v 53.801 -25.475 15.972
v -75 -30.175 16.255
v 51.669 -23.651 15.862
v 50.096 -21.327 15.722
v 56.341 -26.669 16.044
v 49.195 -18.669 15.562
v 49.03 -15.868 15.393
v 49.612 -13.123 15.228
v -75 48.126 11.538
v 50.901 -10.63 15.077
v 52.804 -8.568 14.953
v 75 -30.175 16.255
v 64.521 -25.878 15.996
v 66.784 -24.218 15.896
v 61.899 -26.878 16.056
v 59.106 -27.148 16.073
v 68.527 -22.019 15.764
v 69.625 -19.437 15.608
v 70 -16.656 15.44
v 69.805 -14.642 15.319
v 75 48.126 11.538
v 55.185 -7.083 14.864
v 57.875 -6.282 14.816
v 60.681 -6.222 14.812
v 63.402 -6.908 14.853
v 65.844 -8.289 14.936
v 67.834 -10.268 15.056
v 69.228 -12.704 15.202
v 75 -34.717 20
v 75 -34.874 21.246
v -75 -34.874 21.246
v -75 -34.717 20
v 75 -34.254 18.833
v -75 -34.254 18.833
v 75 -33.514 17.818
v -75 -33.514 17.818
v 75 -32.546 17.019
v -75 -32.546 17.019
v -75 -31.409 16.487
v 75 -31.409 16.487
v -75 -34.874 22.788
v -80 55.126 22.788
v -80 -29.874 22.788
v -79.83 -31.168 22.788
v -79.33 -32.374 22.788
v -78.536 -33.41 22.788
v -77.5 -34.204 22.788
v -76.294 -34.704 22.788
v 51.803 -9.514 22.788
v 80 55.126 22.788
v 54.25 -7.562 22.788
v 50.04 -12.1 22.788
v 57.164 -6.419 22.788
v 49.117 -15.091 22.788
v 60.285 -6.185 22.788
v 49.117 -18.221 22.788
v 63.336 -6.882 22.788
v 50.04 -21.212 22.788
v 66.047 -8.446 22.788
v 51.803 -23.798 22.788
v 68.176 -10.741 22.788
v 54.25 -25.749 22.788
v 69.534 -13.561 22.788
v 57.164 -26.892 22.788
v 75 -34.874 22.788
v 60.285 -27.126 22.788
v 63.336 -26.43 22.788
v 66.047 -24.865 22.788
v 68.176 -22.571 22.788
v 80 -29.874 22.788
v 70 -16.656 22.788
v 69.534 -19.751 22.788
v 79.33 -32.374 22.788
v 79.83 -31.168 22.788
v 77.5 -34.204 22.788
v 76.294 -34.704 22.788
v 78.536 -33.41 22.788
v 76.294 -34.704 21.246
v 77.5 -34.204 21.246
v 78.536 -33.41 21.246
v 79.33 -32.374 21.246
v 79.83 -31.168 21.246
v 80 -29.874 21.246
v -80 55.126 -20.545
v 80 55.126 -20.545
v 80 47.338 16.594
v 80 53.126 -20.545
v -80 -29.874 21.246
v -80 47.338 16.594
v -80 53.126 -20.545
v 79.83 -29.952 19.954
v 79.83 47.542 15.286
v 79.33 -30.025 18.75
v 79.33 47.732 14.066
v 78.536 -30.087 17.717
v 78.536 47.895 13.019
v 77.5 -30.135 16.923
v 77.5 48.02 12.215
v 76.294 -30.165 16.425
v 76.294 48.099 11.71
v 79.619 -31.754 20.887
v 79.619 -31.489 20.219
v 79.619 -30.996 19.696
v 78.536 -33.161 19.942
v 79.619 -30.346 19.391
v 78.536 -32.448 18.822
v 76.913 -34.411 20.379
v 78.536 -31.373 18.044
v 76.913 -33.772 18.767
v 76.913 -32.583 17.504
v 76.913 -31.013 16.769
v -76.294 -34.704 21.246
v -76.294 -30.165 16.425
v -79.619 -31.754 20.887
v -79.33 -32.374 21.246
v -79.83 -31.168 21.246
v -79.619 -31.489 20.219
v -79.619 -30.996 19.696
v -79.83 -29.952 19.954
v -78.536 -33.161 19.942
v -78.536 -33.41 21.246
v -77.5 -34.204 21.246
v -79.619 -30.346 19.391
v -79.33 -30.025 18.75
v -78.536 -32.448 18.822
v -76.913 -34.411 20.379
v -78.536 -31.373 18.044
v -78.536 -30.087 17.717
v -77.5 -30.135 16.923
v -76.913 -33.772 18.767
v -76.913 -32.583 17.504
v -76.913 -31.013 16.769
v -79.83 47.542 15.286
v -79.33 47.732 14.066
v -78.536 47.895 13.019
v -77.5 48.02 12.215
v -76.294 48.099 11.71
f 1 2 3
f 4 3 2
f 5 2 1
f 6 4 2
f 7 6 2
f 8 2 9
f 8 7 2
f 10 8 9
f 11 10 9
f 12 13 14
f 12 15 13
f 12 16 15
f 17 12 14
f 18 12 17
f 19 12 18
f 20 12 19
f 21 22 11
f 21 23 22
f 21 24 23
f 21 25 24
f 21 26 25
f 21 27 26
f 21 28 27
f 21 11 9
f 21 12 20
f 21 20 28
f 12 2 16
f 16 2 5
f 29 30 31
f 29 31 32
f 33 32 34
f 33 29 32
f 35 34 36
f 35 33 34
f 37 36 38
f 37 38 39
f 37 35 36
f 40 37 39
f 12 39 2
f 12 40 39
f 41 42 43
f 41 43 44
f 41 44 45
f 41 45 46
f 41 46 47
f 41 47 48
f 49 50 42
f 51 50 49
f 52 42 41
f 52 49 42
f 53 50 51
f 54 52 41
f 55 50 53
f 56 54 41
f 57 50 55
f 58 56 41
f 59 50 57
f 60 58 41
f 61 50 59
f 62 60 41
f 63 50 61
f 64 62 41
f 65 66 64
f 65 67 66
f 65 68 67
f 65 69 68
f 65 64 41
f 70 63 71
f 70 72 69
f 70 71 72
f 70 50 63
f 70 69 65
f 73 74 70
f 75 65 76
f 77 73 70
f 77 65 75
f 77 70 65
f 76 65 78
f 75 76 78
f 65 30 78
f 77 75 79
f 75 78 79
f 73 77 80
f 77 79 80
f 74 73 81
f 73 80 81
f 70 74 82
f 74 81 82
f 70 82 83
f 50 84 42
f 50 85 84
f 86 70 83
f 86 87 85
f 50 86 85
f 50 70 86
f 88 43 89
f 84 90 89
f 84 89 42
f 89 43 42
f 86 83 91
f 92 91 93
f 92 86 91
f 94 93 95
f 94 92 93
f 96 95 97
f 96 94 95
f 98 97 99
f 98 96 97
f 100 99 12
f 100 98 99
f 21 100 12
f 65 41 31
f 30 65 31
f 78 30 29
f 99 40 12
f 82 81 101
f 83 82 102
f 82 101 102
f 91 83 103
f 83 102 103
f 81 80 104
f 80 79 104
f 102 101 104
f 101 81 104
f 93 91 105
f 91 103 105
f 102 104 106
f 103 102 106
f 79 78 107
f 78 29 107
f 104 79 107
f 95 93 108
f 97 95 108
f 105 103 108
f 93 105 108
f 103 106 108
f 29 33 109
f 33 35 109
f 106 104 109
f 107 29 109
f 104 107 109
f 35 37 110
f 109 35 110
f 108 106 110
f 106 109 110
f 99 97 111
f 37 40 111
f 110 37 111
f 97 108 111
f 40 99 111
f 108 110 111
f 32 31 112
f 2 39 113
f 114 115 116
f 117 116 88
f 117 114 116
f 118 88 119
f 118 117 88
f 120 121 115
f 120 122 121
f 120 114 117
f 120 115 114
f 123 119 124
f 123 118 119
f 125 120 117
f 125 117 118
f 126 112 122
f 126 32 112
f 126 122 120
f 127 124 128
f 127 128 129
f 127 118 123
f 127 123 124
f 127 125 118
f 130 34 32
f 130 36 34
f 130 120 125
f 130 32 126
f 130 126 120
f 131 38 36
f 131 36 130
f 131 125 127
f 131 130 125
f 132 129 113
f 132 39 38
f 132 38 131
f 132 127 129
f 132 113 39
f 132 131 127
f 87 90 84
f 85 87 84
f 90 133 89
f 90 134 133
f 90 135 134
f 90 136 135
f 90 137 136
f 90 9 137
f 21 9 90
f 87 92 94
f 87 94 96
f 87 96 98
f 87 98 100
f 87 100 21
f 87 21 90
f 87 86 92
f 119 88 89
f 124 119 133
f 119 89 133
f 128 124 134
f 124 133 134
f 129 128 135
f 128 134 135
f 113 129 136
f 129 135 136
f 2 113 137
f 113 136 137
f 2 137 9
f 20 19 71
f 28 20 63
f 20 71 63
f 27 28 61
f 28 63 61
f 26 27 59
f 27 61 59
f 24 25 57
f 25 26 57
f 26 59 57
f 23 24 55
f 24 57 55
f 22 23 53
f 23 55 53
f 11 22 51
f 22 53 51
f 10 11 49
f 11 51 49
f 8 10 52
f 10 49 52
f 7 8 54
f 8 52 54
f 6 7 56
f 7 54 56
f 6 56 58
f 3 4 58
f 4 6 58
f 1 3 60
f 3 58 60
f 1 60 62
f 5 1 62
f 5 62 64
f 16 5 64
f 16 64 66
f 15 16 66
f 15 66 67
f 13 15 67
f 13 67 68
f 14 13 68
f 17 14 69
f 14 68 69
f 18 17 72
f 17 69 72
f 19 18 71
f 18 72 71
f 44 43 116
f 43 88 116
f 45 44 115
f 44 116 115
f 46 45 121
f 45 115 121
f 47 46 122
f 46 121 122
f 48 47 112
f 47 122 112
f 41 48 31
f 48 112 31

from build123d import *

# Parameters (mm, degrees)
F1_DEPTH = 80
F2_R     = 10.5
F3_DEPTH = 25
F4_R     = 5


with BuildPart() as f1:
    # F0 (on Right) → F1 (new body, symmetric)
    with BuildSketch(Plane.YZ):
        Polygon((55.125829, 22.787926), (-34.874171, 22.787926), (-34.874171, 16.537924), (48.125829, 11.537924), (53.125829, -20.545409), (55.125829, -20.545409), align=None)
    extrude(amount=F1_DEPTH, both=True)

    # F2 (on face) → F3 (cut)
    with BuildSketch(Plane.XY.offset(22.787926)):
        with Locations((59.5, -16.65573)):
            Circle(F2_R)
    extrude(amount=-F3_DEPTH, mode=Mode.SUBTRACT)

    # F4
    f4_edges = [f1.edges().sort_by_distance(p)[0] for p in [
        (80, -34.874171, 19.662925),
        (-80, -34.874171, 19.662925),
        (80, 6.625829, 14.037924),
        (-80, 6.625829, 14.037924),
        (0, -34.874171, 16.537924),
    ]]
    fillet(f4_edges, radius=F4_R)


solid = f1.part
